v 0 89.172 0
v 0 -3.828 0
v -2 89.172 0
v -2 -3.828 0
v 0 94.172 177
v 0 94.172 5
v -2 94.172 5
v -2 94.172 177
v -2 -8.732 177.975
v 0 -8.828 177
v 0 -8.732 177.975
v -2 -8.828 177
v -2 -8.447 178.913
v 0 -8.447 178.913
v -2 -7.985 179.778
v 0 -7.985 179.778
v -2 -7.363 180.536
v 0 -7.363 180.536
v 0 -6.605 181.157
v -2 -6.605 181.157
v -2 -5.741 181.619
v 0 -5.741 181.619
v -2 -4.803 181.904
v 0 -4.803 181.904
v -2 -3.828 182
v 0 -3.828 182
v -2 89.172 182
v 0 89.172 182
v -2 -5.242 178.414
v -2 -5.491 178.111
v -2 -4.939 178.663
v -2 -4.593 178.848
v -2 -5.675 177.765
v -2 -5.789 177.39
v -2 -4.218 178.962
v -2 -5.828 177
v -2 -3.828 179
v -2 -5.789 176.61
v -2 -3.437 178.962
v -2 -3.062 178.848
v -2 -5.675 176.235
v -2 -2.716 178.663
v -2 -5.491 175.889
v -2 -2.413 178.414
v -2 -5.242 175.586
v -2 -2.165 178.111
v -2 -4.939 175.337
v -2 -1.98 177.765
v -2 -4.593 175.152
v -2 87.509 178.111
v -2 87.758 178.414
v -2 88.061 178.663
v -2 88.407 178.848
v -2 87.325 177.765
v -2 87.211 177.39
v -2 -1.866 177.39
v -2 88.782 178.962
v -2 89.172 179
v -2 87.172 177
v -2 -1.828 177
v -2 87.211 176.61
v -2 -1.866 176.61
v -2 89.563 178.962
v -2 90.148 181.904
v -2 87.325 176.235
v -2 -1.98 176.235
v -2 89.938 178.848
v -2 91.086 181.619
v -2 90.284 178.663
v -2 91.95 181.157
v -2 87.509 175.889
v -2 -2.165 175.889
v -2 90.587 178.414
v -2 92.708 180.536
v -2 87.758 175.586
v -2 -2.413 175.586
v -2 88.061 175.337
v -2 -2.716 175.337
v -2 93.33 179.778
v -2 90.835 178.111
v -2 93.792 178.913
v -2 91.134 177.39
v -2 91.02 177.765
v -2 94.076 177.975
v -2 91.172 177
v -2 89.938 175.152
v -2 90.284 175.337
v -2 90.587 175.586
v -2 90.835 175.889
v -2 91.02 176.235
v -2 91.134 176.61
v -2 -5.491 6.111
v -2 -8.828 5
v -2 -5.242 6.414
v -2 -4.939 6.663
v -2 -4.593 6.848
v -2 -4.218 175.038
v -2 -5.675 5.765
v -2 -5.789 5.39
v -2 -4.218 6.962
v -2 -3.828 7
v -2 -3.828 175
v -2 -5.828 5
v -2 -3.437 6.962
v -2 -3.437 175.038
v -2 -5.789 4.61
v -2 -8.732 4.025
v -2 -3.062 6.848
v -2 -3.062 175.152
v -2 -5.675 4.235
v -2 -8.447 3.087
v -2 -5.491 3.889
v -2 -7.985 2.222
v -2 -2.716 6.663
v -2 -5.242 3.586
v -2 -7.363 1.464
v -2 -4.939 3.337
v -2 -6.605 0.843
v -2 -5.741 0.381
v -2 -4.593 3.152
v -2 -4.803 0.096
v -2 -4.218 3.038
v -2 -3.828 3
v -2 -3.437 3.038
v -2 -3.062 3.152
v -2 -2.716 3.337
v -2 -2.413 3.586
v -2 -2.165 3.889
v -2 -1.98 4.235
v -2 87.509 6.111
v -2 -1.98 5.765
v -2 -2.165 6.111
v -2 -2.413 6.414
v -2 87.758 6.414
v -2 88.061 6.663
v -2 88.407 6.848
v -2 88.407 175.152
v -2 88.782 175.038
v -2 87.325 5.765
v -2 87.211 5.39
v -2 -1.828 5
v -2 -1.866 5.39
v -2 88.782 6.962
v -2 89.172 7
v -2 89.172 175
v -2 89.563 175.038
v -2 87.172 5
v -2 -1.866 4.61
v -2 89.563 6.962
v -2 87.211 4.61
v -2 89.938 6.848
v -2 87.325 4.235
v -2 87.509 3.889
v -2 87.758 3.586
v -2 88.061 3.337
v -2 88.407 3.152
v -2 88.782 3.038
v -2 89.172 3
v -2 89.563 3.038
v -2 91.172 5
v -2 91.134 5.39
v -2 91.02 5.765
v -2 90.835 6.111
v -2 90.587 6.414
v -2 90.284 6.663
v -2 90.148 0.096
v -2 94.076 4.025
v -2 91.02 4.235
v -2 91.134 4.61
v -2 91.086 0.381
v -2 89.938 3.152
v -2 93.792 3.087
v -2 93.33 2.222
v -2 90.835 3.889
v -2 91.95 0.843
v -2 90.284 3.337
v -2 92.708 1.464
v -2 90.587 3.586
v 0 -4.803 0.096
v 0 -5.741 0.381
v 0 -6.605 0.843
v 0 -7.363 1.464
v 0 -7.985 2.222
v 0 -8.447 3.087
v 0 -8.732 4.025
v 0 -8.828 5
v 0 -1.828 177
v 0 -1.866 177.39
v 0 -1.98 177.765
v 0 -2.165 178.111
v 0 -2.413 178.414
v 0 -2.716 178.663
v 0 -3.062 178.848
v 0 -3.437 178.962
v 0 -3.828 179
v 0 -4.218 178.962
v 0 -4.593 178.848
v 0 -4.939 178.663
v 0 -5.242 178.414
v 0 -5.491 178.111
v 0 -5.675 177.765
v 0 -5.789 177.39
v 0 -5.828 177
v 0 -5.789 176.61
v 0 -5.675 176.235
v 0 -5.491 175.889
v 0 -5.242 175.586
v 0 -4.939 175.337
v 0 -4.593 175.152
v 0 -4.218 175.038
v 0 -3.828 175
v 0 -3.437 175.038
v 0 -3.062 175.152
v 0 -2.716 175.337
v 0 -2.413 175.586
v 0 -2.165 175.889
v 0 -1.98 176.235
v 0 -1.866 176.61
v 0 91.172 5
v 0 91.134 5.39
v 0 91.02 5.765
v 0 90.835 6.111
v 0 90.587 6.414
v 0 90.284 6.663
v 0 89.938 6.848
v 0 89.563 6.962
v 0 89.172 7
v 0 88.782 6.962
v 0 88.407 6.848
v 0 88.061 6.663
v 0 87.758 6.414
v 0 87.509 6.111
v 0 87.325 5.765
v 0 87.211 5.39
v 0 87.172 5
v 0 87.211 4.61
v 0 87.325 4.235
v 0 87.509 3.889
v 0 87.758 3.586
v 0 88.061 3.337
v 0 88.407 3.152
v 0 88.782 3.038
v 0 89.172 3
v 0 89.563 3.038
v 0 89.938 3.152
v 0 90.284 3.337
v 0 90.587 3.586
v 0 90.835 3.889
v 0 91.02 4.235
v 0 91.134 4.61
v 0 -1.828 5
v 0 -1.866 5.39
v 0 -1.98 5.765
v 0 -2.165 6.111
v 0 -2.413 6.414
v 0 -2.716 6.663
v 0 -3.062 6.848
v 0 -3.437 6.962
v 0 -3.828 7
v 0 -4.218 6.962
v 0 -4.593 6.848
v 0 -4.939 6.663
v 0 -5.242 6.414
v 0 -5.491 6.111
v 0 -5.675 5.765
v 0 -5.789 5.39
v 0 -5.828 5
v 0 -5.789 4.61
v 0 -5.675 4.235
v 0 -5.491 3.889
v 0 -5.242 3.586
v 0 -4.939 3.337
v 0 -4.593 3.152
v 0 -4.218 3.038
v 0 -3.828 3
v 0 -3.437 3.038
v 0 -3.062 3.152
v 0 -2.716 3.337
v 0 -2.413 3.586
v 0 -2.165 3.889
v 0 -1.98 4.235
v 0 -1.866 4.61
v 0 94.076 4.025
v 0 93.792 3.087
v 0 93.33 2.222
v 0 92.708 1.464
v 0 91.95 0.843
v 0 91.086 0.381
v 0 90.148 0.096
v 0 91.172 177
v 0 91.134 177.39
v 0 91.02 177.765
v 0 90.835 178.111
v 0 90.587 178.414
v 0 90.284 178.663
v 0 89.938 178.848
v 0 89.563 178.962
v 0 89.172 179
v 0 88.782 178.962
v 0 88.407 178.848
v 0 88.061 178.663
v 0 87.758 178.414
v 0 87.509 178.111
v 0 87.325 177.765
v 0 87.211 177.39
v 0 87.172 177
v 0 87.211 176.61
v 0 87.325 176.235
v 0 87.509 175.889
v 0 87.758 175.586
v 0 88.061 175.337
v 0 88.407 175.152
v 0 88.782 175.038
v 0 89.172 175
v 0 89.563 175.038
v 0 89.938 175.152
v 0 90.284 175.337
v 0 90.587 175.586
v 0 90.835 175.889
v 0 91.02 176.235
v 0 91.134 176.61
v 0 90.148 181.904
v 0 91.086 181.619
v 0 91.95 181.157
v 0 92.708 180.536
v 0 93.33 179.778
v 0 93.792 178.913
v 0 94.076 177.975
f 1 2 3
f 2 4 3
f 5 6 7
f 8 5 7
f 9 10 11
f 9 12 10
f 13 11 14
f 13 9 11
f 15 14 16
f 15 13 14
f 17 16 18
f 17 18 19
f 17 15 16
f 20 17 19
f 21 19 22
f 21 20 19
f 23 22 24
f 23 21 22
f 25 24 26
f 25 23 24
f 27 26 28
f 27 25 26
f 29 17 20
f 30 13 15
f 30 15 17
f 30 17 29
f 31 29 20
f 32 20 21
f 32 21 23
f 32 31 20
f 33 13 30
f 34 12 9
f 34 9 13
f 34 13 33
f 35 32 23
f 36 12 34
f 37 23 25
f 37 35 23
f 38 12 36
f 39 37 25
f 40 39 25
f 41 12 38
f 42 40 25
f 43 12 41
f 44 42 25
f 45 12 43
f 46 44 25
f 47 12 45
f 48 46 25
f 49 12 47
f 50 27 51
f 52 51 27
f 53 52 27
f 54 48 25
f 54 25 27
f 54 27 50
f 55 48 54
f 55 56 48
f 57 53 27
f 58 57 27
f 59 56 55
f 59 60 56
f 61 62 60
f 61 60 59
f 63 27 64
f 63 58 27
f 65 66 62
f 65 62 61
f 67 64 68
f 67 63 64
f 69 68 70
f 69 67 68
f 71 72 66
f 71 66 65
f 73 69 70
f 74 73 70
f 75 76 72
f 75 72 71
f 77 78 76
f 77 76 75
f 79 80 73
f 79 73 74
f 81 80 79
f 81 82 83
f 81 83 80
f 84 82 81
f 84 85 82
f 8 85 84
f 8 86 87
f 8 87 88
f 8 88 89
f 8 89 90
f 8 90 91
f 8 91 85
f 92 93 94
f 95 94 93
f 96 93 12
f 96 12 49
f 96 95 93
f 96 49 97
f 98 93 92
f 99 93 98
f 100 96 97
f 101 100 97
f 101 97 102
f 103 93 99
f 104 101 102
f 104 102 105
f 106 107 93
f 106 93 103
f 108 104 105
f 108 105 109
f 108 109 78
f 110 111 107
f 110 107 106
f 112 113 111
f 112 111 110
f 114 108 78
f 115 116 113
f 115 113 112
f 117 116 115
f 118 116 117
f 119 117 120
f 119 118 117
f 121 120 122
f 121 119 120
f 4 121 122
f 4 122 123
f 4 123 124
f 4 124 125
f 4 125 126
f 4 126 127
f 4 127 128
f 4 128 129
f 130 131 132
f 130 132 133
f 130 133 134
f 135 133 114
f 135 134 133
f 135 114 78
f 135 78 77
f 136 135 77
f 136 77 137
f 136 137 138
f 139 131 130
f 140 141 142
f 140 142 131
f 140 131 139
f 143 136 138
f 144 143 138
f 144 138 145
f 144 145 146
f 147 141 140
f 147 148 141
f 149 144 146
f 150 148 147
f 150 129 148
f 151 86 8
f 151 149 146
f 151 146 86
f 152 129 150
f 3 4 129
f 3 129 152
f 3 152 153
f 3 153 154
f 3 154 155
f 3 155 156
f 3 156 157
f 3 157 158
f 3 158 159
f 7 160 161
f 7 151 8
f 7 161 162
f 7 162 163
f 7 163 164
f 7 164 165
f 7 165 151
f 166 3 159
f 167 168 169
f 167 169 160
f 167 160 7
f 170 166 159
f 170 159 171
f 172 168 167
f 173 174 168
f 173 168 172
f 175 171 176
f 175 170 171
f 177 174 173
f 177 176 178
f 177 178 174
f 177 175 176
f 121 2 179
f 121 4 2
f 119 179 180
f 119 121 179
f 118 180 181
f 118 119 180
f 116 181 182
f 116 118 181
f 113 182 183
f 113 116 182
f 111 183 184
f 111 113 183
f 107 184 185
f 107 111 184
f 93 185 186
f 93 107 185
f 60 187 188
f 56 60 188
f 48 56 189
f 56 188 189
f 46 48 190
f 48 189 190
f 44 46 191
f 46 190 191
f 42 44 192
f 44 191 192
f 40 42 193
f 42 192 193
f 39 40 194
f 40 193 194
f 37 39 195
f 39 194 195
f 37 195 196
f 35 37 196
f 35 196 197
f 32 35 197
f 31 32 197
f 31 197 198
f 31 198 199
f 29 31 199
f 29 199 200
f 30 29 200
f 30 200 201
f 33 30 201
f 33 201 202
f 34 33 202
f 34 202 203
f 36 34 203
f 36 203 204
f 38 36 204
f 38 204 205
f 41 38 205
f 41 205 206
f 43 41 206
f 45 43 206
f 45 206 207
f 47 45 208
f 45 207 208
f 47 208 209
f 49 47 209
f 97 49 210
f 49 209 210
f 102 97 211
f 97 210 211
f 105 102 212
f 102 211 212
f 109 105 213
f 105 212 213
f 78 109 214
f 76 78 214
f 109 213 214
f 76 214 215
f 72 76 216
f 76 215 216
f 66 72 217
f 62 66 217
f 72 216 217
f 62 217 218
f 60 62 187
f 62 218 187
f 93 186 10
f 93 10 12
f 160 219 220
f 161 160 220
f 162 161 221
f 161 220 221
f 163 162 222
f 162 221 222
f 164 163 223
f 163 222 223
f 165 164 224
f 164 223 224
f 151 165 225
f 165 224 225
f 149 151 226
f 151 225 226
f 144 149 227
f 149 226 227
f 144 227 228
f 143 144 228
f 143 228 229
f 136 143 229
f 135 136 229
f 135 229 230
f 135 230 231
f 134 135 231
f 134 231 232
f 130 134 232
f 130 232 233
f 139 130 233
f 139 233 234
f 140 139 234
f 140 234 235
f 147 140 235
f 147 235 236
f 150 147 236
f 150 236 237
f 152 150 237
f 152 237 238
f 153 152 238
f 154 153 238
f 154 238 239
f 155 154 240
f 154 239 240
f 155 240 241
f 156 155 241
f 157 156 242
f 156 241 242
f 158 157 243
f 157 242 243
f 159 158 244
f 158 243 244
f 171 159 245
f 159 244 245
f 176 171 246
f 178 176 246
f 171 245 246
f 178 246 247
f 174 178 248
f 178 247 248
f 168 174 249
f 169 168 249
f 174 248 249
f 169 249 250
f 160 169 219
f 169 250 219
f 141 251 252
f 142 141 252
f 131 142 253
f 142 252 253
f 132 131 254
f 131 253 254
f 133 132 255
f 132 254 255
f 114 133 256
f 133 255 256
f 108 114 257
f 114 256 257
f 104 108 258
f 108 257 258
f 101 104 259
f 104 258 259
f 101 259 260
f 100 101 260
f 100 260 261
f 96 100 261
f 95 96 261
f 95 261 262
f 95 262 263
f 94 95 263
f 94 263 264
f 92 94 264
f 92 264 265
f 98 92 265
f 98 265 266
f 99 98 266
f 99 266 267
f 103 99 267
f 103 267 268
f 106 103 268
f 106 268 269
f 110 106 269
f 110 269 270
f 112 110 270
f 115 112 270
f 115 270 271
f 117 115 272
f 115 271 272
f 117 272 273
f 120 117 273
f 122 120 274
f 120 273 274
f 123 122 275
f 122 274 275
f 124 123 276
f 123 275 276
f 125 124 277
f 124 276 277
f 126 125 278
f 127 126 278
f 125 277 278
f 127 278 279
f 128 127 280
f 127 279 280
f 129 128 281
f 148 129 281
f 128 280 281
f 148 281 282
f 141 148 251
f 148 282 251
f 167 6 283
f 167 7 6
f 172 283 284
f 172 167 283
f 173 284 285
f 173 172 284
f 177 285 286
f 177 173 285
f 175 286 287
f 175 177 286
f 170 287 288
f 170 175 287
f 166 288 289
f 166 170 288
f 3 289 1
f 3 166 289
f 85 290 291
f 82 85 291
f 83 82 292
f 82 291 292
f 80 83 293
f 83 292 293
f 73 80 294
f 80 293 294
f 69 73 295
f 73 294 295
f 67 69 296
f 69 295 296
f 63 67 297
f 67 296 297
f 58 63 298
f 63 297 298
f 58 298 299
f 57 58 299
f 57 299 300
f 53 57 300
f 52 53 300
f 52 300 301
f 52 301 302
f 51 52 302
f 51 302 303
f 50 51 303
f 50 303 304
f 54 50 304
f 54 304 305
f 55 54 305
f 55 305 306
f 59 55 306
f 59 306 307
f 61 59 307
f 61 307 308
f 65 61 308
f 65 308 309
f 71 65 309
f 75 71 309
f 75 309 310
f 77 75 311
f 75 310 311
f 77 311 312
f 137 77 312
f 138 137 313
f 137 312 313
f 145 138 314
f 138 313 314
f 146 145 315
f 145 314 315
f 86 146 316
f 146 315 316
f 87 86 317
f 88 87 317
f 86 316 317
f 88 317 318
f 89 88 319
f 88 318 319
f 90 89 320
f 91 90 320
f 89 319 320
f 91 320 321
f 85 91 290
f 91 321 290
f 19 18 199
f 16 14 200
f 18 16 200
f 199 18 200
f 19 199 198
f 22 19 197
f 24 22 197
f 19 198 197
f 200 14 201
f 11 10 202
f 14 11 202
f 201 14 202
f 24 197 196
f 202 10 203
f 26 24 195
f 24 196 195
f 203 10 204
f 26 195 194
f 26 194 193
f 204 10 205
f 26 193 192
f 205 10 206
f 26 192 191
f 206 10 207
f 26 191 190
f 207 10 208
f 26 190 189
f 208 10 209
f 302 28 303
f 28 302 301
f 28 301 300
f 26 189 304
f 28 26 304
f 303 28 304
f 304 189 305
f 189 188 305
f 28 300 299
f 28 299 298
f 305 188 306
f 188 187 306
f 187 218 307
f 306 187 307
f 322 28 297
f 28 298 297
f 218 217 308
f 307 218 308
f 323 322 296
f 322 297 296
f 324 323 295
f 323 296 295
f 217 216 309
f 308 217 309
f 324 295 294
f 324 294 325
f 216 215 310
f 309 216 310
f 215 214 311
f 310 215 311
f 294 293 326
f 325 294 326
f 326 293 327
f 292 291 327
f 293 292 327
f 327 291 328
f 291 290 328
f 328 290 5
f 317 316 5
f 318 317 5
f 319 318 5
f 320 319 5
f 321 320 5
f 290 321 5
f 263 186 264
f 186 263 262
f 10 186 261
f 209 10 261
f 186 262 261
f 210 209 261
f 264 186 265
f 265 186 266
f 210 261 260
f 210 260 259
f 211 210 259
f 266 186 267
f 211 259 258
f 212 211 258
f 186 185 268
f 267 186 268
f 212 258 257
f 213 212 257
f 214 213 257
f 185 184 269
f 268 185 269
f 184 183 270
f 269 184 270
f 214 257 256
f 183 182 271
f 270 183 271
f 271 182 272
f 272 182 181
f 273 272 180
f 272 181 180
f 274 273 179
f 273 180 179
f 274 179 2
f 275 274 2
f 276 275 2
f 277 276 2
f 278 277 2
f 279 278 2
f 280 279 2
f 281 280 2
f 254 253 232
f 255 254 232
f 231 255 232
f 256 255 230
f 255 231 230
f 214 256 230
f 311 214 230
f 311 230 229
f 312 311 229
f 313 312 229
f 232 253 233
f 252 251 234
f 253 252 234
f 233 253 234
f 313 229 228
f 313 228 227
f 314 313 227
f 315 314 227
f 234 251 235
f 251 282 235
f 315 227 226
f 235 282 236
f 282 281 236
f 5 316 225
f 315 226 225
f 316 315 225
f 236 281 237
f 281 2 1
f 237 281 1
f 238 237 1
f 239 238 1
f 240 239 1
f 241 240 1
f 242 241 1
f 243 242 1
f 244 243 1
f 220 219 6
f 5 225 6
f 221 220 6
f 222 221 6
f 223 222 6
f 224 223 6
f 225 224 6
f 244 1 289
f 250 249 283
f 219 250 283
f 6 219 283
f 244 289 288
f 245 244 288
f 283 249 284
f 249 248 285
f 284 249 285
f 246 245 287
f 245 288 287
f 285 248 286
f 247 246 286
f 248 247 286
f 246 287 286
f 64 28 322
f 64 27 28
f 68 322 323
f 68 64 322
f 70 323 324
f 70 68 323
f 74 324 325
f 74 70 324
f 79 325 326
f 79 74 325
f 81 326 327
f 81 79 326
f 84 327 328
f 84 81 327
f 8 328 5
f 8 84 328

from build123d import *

# Parameters (mm, degrees)
SKETCH1_W           = 103
SKETCH1_H           = 2
BOSS_EXTRUDE1_DEPTH = 182
SKETCH2_R           = 2
CUT_EXTRUDE1_DEPTH  = 168
FILLET1_R           = 5
FILLET2_R           = 5
FILLET3_R           = 5
FILLET4_R           = 5


with BuildPart() as part:
    # Sketch1 → Boss-Extrude1 (new body)
    with BuildSketch(Plane(origin=(0, 0, 0), x_dir=(0, 1, 0), z_dir=(0, 0, 1))):
        with Locations((42.672413793, 1)):
            Rectangle(SKETCH1_W, SKETCH1_H)
    extrude(amount=BOSS_EXTRUDE1_DEPTH)

    # Sketch2 → Cut-Extrude1 (cut)
    with BuildSketch(Plane.YZ):
        with Locations((-3.827586207, 177)):
            Circle(SKETCH2_R)
        with Locations((89.172413793, 177)):
            Circle(SKETCH2_R)
        with Locations((89.172413793, 5)):
            Circle(SKETCH2_R)
        with Locations((-3.827586207, 5)):
            Circle(SKETCH2_R)
    extrude(amount=-CUT_EXTRUDE1_DEPTH, mode=Mode.SUBTRACT)

    # Fillet1
    fillet1_edges = [part.edges().sort_by_distance(p)[0] for p in [
        (-1, -8.827586207, 182),
    ]]
    fillet(fillet1_edges, radius=FILLET1_R)

    # Fillet2
    fillet2_edges = [part.edges().sort_by_distance(p)[0] for p in [
        (-1, 94.172413793, 182),
    ]]
    fillet(fillet2_edges, radius=FILLET2_R)

    # Fillet3
    fillet3_edges = [part.edges().sort_by_distance(p)[0] for p in [
        (-1, 94.172413793, 0),
    ]]
    fillet(fillet3_edges, radius=FILLET3_R)

    # Fillet4
    fillet4_edges = [part.edges().sort_by_distance(p)[0] for p in [
        (-1, -8.827586207, 0),
    ]]
    fillet(fillet4_edges, radius=FILLET4_R)


solid = part.part
